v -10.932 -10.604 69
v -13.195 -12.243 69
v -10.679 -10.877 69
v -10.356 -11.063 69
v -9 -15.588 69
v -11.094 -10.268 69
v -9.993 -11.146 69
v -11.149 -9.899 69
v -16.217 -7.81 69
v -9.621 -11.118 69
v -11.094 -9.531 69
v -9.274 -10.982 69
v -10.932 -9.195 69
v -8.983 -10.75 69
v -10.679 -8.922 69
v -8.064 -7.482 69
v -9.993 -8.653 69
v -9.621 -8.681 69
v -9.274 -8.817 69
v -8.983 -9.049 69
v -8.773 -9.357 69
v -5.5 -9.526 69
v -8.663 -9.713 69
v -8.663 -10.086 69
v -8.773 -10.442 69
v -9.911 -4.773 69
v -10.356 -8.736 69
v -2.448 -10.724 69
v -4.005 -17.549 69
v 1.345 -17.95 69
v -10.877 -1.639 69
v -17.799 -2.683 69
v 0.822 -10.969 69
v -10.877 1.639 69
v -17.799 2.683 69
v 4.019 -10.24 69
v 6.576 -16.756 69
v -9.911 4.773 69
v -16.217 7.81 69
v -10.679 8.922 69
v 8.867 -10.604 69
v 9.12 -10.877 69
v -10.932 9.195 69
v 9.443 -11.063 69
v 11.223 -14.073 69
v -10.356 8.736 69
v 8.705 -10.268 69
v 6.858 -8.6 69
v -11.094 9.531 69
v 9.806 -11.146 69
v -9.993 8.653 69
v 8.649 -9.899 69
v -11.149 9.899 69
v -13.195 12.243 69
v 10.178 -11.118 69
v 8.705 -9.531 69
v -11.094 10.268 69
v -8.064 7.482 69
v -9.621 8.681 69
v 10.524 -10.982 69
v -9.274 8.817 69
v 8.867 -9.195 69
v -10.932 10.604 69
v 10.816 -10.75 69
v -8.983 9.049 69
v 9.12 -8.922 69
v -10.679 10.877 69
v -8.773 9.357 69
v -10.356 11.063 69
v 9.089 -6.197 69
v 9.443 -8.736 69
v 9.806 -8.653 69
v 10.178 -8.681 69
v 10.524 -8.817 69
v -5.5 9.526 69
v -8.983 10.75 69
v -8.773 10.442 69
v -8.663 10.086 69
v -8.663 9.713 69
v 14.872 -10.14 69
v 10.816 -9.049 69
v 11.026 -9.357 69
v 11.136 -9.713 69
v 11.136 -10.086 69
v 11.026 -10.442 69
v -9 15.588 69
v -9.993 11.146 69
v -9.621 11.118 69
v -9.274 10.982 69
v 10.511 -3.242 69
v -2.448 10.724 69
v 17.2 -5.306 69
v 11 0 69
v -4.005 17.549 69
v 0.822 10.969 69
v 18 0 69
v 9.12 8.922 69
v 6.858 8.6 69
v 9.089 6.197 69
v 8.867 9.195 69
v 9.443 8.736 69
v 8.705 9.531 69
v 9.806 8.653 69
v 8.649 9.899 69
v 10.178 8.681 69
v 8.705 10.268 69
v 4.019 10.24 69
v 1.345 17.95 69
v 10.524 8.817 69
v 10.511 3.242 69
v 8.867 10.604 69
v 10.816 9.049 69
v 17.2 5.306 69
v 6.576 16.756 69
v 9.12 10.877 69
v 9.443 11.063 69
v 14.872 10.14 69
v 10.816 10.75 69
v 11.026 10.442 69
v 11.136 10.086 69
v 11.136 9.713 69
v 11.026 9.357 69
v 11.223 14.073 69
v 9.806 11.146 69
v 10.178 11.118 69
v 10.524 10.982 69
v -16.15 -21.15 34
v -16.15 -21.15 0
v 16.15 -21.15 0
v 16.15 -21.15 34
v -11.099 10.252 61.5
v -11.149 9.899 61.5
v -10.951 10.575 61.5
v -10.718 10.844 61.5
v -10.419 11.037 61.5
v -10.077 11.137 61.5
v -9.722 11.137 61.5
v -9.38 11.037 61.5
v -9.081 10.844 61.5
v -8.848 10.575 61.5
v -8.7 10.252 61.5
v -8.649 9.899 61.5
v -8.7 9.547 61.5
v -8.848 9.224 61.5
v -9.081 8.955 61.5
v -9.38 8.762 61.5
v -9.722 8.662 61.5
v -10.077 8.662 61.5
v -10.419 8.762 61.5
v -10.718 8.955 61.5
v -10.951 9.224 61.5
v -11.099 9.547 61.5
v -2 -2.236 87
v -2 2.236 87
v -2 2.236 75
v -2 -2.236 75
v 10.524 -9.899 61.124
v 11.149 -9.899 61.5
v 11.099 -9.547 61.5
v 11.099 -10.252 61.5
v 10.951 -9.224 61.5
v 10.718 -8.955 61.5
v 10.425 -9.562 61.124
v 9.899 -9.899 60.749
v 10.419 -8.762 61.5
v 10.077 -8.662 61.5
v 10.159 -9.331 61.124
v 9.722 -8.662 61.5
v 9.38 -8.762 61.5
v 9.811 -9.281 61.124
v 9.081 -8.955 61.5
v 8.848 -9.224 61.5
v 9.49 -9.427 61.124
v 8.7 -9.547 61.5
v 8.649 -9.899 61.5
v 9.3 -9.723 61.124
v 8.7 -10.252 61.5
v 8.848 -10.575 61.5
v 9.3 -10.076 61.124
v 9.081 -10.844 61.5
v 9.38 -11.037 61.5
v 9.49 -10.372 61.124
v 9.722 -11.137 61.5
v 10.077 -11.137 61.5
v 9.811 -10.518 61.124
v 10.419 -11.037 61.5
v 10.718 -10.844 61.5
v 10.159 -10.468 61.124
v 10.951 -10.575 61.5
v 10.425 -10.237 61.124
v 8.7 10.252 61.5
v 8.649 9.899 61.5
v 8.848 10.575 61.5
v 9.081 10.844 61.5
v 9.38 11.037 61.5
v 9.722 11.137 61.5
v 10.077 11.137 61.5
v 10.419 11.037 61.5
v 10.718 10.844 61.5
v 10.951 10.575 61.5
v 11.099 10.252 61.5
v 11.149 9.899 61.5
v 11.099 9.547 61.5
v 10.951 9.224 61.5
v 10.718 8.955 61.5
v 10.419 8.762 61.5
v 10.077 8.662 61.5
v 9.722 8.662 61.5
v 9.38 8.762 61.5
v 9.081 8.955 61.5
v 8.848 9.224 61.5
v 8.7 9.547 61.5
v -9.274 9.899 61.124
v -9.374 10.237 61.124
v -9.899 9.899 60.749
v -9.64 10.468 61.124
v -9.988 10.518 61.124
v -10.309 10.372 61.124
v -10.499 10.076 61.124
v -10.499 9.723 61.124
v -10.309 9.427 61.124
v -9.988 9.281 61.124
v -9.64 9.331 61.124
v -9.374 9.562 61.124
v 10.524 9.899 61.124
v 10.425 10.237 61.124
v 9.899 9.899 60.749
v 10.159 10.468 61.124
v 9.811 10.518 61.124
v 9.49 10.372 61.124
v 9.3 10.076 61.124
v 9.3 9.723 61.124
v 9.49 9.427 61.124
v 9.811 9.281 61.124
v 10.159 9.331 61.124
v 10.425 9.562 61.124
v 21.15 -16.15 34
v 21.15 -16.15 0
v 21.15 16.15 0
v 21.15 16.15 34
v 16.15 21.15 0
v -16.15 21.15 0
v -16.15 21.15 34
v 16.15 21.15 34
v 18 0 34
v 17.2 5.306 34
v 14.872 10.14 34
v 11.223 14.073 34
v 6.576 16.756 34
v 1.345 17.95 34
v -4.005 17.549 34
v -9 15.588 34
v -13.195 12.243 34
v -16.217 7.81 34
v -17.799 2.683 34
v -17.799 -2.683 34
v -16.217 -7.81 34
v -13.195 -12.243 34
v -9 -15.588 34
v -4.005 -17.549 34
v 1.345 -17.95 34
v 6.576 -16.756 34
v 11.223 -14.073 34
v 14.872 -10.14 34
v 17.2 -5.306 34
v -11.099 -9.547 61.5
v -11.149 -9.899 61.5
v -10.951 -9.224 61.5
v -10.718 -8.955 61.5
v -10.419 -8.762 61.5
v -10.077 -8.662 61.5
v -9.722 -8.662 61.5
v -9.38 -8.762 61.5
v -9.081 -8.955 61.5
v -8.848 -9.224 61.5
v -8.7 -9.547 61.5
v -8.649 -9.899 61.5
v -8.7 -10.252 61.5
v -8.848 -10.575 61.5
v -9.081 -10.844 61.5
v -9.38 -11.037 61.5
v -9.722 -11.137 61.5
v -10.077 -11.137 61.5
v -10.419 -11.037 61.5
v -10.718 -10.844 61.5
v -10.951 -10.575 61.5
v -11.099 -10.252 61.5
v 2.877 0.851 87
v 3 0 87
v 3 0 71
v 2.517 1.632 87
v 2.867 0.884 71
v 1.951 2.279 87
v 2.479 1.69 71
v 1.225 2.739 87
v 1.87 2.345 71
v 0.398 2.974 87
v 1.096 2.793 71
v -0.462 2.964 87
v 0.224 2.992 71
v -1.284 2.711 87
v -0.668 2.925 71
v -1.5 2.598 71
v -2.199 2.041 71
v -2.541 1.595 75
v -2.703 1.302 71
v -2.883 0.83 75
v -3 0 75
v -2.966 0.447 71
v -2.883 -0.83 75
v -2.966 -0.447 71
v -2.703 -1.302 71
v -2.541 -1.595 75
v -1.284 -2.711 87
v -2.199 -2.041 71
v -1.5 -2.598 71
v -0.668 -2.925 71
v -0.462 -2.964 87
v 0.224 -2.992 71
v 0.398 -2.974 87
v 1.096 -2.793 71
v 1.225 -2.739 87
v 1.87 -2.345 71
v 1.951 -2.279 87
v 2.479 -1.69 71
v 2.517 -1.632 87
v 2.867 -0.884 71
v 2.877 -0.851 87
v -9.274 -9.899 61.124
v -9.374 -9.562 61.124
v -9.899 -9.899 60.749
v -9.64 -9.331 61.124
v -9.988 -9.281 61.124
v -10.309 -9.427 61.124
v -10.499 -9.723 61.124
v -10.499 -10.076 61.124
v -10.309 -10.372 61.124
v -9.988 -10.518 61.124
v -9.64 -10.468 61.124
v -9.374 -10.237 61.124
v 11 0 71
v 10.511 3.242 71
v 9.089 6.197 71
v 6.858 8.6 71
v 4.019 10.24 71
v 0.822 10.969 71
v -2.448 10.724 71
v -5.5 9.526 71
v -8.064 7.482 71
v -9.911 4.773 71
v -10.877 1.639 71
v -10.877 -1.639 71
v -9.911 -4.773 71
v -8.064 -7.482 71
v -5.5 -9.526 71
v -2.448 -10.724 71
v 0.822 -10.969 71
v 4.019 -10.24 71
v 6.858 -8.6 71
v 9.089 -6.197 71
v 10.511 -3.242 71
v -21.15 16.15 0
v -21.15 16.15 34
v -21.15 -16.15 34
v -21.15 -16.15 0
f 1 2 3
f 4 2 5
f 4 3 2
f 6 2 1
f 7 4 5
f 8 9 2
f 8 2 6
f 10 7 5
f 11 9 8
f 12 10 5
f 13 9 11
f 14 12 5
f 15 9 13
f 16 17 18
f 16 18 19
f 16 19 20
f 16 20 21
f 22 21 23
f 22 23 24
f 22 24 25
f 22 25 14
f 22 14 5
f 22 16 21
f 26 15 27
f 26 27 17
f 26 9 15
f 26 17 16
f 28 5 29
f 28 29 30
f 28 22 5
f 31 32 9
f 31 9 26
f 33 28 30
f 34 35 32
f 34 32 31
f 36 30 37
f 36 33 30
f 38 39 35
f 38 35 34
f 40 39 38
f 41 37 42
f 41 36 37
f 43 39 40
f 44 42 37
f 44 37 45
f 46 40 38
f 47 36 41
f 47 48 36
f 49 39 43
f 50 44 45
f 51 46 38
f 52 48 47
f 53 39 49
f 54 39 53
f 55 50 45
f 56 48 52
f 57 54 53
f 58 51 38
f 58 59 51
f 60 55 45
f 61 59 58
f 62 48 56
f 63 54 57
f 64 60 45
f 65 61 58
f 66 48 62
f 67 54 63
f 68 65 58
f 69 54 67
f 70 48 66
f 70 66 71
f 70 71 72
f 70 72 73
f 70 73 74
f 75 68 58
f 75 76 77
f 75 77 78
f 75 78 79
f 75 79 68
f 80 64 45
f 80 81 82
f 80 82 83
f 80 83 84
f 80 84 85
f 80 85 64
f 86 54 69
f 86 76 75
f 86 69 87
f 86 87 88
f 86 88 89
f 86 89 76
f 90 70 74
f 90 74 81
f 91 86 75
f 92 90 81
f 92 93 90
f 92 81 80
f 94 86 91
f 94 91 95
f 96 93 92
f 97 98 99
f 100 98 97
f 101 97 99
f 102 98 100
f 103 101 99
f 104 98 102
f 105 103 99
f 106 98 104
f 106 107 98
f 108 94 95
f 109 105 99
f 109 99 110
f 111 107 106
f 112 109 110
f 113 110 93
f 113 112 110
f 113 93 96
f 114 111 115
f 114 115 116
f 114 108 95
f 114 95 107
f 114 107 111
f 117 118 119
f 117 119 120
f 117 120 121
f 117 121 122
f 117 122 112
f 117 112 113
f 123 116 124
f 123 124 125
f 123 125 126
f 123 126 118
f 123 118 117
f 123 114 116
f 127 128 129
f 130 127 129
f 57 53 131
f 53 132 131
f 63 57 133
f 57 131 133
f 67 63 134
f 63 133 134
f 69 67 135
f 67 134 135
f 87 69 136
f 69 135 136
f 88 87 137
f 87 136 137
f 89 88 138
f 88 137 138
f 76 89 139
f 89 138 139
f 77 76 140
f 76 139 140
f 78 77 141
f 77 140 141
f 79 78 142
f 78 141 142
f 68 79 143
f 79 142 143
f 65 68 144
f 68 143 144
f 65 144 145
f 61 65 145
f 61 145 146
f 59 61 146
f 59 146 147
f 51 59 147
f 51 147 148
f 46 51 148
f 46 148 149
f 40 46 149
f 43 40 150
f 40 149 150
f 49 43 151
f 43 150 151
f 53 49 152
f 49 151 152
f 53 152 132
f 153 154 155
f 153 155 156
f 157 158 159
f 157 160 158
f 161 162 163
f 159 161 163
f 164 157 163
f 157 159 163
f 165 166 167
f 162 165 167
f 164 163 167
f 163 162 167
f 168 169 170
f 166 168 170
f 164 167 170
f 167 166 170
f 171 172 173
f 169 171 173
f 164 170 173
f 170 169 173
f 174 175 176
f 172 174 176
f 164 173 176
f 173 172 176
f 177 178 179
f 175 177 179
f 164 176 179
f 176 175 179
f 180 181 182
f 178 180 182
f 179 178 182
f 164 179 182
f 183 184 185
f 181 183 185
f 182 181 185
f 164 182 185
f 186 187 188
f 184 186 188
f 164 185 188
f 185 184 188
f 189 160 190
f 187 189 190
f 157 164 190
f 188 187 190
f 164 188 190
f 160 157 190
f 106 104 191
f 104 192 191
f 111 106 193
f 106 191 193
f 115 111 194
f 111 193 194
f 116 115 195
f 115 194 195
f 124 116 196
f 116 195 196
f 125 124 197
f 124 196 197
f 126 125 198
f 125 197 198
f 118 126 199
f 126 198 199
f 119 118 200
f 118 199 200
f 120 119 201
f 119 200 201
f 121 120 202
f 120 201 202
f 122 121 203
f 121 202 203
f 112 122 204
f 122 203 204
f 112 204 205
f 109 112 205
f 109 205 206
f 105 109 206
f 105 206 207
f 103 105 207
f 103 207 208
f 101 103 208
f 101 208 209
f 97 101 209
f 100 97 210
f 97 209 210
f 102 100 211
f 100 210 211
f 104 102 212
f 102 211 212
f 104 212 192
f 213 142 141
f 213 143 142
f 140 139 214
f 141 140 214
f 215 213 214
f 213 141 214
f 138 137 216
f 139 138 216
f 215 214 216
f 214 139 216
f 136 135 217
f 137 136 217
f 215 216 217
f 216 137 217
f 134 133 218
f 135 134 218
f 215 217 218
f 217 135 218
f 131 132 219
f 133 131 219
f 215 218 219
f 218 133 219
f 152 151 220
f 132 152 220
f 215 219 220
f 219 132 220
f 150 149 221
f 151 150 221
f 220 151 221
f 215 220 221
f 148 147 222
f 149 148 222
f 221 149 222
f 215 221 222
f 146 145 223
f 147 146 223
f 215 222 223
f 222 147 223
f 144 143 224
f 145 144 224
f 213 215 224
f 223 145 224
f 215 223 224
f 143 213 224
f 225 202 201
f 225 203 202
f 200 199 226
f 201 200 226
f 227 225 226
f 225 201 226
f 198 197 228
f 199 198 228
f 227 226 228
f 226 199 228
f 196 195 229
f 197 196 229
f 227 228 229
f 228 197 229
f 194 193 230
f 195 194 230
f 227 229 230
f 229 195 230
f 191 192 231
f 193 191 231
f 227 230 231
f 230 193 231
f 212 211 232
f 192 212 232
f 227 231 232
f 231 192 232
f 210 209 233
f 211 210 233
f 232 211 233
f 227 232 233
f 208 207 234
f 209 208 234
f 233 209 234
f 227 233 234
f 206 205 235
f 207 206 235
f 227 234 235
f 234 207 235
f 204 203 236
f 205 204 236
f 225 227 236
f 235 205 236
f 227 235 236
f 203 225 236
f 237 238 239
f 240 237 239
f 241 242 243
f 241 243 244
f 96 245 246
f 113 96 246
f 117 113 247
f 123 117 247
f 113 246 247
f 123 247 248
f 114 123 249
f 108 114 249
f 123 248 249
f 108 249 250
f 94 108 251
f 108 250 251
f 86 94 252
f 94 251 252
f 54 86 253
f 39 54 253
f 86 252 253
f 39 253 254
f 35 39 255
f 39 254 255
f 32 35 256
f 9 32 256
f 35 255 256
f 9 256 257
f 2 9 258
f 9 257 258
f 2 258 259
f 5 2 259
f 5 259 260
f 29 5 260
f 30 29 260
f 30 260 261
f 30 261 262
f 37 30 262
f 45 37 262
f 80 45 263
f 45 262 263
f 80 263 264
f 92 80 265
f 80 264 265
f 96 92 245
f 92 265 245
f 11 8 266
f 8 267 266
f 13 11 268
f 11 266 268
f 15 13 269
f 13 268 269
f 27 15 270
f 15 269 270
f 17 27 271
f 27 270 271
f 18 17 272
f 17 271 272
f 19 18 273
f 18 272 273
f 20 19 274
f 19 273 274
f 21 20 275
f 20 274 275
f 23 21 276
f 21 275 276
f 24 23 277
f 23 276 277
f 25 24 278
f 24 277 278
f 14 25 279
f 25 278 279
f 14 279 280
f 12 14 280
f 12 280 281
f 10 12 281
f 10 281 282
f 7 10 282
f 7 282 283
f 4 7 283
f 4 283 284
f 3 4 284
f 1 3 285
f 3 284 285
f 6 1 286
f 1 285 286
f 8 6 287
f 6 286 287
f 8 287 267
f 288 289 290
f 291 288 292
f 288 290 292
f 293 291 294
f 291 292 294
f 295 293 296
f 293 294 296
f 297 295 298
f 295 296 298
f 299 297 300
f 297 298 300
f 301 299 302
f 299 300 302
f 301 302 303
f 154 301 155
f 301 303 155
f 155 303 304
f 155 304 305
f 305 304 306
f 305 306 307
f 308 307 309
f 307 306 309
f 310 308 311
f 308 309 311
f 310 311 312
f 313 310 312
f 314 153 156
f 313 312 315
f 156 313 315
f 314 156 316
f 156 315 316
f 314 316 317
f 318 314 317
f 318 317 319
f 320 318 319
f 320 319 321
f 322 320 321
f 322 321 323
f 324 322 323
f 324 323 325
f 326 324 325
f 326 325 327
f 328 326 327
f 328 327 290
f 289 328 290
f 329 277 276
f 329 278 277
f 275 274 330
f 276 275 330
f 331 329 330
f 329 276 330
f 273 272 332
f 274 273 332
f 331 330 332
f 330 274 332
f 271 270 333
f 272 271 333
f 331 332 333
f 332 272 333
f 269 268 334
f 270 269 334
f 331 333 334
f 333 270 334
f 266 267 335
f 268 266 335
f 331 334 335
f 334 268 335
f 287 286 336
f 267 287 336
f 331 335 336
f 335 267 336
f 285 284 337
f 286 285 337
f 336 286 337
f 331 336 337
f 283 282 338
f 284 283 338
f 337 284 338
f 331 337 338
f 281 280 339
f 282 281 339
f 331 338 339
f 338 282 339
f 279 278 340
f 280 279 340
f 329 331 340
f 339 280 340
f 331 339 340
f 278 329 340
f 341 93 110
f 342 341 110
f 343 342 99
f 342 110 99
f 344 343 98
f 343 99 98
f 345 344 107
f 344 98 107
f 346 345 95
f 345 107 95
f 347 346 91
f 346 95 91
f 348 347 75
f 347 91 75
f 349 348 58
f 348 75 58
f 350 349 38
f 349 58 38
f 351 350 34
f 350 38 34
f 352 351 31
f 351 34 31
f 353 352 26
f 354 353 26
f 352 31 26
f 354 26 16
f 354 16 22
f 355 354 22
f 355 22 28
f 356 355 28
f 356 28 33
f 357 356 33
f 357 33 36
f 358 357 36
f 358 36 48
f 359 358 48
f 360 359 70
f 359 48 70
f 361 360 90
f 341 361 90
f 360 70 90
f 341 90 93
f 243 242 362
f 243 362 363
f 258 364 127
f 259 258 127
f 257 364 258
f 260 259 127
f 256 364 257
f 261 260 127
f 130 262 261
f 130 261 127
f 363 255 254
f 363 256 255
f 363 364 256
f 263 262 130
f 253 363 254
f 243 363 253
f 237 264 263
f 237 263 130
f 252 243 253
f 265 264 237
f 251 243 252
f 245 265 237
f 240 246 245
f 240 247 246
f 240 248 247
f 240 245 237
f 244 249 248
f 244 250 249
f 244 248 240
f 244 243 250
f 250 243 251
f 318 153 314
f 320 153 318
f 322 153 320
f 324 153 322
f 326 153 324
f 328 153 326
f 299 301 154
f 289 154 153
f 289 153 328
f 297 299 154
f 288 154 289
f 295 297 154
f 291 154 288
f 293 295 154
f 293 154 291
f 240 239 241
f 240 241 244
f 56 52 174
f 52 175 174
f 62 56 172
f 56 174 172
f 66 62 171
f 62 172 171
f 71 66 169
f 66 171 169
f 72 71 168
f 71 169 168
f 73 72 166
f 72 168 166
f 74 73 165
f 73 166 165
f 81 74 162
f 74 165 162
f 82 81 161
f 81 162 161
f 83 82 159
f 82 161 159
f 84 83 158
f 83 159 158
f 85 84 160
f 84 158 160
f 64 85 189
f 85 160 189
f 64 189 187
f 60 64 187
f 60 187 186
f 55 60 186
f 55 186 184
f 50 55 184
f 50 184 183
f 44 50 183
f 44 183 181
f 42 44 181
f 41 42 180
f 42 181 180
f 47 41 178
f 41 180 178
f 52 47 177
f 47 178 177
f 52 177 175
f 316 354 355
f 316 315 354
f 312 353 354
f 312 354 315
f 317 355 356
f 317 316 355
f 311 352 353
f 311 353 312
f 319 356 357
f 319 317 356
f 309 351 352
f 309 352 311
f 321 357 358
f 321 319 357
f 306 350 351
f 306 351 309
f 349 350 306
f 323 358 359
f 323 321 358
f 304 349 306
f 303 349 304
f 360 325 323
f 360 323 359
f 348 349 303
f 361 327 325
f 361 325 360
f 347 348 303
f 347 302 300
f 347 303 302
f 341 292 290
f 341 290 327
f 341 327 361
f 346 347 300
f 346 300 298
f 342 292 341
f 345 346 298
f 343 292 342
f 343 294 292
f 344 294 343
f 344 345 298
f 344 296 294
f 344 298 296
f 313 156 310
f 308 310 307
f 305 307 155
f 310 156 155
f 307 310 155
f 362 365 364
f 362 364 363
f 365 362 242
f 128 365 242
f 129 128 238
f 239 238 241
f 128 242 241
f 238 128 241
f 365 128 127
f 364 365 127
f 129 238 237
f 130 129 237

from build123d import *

# Parameters (mm, degrees)
SKETCH1_W                 = 42.3
SKETCH1_H                 = 42.3
BOSS_EXTRUDE1_DEPTH       = 34
SKETCH2_R                 = 18
BOSS_EXTRUDE2_DEPTH       = 35
SKETCH3_R                 = 11
BOSS_EXTRUDE3_DEPTH       = 2
SKETCH4_R                 = 3
BOSS_EXTRUDE4_DEPTH       = 16
CUT_EXTRUDE1_DEPTH        = 12
CHAMFER1_SIZE             = 5
M3X0_5_TAPPED_HOLE1_D     = 2.5
M3X0_5_TAPPED_HOLE1_DEPTH = 7.5
M3X0_5_TAPPED_HOLE1_TIP   = 0.751075774


with BuildPart() as part:
    # Sketch1 → Boss-Extrude1 (new body)
    with BuildSketch(Plane.XY):
        Rectangle(SKETCH1_W, SKETCH1_H)
    extrude(amount=BOSS_EXTRUDE1_DEPTH)

    # Sketch2 → Boss-Extrude2 (add)
    with BuildSketch(Plane.XY.offset(34)):
        Circle(SKETCH2_R)
    extrude(amount=BOSS_EXTRUDE2_DEPTH)

    # Sketch3 → Boss-Extrude3 (add)
    with BuildSketch(Plane.XY.offset(69)):
        Circle(SKETCH3_R)
    extrude(amount=BOSS_EXTRUDE3_DEPTH)

    # Sketch4 → Boss-Extrude4 (add)
    with BuildSketch(Plane.XY.offset(71)):
        Circle(SKETCH4_R)
    extrude(amount=BOSS_EXTRUDE4_DEPTH)

    # Sketch5 → Cut-Extrude1 (cut)
    with BuildSketch(Plane.XY.offset(87)):
        with BuildLine():
            Line((-2, 2.236067977), (-2, -2.236067977))
            ThreePointArc((-2, -2.236067977), (-3, 0), (-2, 2.236067977))
        make_face()
    extrude(amount=-CUT_EXTRUDE1_DEPTH, mode=Mode.SUBTRACT)

    # Chamfer1
    chamfer1_edges = [part.edges().sort_by_distance(p)[0] for p in [
        (-21.15, -21.15, 17),
        (21.15, -21.15, 17),
        (21.15, 21.15, 17),
        (-21.15, 21.15, 17),
    ]]
    chamfer(chamfer1_edges, length=CHAMFER1_SIZE)

    # M3x0.5 Tapped Hole1
    with Locations(Plane.XY.offset(69)):
        with Locations((-9.899494937, 9.899494937), (9.899494937, 9.899494937), (9.899494937, -9.899494937), (-9.899494937, -9.899494937)):
            Hole(M3X0_5_TAPPED_HOLE1_D / 2, depth=M3X0_5_TAPPED_HOLE1_DEPTH)
            with Locations((0, 0, -(M3X0_5_TAPPED_HOLE1_DEPTH + M3X0_5_TAPPED_HOLE1_TIP / 2))):  # 118° drill point
                Cone(0, M3X0_5_TAPPED_HOLE1_D / 2, M3X0_5_TAPPED_HOLE1_TIP, mode=Mode.SUBTRACT)


solid = part.part
